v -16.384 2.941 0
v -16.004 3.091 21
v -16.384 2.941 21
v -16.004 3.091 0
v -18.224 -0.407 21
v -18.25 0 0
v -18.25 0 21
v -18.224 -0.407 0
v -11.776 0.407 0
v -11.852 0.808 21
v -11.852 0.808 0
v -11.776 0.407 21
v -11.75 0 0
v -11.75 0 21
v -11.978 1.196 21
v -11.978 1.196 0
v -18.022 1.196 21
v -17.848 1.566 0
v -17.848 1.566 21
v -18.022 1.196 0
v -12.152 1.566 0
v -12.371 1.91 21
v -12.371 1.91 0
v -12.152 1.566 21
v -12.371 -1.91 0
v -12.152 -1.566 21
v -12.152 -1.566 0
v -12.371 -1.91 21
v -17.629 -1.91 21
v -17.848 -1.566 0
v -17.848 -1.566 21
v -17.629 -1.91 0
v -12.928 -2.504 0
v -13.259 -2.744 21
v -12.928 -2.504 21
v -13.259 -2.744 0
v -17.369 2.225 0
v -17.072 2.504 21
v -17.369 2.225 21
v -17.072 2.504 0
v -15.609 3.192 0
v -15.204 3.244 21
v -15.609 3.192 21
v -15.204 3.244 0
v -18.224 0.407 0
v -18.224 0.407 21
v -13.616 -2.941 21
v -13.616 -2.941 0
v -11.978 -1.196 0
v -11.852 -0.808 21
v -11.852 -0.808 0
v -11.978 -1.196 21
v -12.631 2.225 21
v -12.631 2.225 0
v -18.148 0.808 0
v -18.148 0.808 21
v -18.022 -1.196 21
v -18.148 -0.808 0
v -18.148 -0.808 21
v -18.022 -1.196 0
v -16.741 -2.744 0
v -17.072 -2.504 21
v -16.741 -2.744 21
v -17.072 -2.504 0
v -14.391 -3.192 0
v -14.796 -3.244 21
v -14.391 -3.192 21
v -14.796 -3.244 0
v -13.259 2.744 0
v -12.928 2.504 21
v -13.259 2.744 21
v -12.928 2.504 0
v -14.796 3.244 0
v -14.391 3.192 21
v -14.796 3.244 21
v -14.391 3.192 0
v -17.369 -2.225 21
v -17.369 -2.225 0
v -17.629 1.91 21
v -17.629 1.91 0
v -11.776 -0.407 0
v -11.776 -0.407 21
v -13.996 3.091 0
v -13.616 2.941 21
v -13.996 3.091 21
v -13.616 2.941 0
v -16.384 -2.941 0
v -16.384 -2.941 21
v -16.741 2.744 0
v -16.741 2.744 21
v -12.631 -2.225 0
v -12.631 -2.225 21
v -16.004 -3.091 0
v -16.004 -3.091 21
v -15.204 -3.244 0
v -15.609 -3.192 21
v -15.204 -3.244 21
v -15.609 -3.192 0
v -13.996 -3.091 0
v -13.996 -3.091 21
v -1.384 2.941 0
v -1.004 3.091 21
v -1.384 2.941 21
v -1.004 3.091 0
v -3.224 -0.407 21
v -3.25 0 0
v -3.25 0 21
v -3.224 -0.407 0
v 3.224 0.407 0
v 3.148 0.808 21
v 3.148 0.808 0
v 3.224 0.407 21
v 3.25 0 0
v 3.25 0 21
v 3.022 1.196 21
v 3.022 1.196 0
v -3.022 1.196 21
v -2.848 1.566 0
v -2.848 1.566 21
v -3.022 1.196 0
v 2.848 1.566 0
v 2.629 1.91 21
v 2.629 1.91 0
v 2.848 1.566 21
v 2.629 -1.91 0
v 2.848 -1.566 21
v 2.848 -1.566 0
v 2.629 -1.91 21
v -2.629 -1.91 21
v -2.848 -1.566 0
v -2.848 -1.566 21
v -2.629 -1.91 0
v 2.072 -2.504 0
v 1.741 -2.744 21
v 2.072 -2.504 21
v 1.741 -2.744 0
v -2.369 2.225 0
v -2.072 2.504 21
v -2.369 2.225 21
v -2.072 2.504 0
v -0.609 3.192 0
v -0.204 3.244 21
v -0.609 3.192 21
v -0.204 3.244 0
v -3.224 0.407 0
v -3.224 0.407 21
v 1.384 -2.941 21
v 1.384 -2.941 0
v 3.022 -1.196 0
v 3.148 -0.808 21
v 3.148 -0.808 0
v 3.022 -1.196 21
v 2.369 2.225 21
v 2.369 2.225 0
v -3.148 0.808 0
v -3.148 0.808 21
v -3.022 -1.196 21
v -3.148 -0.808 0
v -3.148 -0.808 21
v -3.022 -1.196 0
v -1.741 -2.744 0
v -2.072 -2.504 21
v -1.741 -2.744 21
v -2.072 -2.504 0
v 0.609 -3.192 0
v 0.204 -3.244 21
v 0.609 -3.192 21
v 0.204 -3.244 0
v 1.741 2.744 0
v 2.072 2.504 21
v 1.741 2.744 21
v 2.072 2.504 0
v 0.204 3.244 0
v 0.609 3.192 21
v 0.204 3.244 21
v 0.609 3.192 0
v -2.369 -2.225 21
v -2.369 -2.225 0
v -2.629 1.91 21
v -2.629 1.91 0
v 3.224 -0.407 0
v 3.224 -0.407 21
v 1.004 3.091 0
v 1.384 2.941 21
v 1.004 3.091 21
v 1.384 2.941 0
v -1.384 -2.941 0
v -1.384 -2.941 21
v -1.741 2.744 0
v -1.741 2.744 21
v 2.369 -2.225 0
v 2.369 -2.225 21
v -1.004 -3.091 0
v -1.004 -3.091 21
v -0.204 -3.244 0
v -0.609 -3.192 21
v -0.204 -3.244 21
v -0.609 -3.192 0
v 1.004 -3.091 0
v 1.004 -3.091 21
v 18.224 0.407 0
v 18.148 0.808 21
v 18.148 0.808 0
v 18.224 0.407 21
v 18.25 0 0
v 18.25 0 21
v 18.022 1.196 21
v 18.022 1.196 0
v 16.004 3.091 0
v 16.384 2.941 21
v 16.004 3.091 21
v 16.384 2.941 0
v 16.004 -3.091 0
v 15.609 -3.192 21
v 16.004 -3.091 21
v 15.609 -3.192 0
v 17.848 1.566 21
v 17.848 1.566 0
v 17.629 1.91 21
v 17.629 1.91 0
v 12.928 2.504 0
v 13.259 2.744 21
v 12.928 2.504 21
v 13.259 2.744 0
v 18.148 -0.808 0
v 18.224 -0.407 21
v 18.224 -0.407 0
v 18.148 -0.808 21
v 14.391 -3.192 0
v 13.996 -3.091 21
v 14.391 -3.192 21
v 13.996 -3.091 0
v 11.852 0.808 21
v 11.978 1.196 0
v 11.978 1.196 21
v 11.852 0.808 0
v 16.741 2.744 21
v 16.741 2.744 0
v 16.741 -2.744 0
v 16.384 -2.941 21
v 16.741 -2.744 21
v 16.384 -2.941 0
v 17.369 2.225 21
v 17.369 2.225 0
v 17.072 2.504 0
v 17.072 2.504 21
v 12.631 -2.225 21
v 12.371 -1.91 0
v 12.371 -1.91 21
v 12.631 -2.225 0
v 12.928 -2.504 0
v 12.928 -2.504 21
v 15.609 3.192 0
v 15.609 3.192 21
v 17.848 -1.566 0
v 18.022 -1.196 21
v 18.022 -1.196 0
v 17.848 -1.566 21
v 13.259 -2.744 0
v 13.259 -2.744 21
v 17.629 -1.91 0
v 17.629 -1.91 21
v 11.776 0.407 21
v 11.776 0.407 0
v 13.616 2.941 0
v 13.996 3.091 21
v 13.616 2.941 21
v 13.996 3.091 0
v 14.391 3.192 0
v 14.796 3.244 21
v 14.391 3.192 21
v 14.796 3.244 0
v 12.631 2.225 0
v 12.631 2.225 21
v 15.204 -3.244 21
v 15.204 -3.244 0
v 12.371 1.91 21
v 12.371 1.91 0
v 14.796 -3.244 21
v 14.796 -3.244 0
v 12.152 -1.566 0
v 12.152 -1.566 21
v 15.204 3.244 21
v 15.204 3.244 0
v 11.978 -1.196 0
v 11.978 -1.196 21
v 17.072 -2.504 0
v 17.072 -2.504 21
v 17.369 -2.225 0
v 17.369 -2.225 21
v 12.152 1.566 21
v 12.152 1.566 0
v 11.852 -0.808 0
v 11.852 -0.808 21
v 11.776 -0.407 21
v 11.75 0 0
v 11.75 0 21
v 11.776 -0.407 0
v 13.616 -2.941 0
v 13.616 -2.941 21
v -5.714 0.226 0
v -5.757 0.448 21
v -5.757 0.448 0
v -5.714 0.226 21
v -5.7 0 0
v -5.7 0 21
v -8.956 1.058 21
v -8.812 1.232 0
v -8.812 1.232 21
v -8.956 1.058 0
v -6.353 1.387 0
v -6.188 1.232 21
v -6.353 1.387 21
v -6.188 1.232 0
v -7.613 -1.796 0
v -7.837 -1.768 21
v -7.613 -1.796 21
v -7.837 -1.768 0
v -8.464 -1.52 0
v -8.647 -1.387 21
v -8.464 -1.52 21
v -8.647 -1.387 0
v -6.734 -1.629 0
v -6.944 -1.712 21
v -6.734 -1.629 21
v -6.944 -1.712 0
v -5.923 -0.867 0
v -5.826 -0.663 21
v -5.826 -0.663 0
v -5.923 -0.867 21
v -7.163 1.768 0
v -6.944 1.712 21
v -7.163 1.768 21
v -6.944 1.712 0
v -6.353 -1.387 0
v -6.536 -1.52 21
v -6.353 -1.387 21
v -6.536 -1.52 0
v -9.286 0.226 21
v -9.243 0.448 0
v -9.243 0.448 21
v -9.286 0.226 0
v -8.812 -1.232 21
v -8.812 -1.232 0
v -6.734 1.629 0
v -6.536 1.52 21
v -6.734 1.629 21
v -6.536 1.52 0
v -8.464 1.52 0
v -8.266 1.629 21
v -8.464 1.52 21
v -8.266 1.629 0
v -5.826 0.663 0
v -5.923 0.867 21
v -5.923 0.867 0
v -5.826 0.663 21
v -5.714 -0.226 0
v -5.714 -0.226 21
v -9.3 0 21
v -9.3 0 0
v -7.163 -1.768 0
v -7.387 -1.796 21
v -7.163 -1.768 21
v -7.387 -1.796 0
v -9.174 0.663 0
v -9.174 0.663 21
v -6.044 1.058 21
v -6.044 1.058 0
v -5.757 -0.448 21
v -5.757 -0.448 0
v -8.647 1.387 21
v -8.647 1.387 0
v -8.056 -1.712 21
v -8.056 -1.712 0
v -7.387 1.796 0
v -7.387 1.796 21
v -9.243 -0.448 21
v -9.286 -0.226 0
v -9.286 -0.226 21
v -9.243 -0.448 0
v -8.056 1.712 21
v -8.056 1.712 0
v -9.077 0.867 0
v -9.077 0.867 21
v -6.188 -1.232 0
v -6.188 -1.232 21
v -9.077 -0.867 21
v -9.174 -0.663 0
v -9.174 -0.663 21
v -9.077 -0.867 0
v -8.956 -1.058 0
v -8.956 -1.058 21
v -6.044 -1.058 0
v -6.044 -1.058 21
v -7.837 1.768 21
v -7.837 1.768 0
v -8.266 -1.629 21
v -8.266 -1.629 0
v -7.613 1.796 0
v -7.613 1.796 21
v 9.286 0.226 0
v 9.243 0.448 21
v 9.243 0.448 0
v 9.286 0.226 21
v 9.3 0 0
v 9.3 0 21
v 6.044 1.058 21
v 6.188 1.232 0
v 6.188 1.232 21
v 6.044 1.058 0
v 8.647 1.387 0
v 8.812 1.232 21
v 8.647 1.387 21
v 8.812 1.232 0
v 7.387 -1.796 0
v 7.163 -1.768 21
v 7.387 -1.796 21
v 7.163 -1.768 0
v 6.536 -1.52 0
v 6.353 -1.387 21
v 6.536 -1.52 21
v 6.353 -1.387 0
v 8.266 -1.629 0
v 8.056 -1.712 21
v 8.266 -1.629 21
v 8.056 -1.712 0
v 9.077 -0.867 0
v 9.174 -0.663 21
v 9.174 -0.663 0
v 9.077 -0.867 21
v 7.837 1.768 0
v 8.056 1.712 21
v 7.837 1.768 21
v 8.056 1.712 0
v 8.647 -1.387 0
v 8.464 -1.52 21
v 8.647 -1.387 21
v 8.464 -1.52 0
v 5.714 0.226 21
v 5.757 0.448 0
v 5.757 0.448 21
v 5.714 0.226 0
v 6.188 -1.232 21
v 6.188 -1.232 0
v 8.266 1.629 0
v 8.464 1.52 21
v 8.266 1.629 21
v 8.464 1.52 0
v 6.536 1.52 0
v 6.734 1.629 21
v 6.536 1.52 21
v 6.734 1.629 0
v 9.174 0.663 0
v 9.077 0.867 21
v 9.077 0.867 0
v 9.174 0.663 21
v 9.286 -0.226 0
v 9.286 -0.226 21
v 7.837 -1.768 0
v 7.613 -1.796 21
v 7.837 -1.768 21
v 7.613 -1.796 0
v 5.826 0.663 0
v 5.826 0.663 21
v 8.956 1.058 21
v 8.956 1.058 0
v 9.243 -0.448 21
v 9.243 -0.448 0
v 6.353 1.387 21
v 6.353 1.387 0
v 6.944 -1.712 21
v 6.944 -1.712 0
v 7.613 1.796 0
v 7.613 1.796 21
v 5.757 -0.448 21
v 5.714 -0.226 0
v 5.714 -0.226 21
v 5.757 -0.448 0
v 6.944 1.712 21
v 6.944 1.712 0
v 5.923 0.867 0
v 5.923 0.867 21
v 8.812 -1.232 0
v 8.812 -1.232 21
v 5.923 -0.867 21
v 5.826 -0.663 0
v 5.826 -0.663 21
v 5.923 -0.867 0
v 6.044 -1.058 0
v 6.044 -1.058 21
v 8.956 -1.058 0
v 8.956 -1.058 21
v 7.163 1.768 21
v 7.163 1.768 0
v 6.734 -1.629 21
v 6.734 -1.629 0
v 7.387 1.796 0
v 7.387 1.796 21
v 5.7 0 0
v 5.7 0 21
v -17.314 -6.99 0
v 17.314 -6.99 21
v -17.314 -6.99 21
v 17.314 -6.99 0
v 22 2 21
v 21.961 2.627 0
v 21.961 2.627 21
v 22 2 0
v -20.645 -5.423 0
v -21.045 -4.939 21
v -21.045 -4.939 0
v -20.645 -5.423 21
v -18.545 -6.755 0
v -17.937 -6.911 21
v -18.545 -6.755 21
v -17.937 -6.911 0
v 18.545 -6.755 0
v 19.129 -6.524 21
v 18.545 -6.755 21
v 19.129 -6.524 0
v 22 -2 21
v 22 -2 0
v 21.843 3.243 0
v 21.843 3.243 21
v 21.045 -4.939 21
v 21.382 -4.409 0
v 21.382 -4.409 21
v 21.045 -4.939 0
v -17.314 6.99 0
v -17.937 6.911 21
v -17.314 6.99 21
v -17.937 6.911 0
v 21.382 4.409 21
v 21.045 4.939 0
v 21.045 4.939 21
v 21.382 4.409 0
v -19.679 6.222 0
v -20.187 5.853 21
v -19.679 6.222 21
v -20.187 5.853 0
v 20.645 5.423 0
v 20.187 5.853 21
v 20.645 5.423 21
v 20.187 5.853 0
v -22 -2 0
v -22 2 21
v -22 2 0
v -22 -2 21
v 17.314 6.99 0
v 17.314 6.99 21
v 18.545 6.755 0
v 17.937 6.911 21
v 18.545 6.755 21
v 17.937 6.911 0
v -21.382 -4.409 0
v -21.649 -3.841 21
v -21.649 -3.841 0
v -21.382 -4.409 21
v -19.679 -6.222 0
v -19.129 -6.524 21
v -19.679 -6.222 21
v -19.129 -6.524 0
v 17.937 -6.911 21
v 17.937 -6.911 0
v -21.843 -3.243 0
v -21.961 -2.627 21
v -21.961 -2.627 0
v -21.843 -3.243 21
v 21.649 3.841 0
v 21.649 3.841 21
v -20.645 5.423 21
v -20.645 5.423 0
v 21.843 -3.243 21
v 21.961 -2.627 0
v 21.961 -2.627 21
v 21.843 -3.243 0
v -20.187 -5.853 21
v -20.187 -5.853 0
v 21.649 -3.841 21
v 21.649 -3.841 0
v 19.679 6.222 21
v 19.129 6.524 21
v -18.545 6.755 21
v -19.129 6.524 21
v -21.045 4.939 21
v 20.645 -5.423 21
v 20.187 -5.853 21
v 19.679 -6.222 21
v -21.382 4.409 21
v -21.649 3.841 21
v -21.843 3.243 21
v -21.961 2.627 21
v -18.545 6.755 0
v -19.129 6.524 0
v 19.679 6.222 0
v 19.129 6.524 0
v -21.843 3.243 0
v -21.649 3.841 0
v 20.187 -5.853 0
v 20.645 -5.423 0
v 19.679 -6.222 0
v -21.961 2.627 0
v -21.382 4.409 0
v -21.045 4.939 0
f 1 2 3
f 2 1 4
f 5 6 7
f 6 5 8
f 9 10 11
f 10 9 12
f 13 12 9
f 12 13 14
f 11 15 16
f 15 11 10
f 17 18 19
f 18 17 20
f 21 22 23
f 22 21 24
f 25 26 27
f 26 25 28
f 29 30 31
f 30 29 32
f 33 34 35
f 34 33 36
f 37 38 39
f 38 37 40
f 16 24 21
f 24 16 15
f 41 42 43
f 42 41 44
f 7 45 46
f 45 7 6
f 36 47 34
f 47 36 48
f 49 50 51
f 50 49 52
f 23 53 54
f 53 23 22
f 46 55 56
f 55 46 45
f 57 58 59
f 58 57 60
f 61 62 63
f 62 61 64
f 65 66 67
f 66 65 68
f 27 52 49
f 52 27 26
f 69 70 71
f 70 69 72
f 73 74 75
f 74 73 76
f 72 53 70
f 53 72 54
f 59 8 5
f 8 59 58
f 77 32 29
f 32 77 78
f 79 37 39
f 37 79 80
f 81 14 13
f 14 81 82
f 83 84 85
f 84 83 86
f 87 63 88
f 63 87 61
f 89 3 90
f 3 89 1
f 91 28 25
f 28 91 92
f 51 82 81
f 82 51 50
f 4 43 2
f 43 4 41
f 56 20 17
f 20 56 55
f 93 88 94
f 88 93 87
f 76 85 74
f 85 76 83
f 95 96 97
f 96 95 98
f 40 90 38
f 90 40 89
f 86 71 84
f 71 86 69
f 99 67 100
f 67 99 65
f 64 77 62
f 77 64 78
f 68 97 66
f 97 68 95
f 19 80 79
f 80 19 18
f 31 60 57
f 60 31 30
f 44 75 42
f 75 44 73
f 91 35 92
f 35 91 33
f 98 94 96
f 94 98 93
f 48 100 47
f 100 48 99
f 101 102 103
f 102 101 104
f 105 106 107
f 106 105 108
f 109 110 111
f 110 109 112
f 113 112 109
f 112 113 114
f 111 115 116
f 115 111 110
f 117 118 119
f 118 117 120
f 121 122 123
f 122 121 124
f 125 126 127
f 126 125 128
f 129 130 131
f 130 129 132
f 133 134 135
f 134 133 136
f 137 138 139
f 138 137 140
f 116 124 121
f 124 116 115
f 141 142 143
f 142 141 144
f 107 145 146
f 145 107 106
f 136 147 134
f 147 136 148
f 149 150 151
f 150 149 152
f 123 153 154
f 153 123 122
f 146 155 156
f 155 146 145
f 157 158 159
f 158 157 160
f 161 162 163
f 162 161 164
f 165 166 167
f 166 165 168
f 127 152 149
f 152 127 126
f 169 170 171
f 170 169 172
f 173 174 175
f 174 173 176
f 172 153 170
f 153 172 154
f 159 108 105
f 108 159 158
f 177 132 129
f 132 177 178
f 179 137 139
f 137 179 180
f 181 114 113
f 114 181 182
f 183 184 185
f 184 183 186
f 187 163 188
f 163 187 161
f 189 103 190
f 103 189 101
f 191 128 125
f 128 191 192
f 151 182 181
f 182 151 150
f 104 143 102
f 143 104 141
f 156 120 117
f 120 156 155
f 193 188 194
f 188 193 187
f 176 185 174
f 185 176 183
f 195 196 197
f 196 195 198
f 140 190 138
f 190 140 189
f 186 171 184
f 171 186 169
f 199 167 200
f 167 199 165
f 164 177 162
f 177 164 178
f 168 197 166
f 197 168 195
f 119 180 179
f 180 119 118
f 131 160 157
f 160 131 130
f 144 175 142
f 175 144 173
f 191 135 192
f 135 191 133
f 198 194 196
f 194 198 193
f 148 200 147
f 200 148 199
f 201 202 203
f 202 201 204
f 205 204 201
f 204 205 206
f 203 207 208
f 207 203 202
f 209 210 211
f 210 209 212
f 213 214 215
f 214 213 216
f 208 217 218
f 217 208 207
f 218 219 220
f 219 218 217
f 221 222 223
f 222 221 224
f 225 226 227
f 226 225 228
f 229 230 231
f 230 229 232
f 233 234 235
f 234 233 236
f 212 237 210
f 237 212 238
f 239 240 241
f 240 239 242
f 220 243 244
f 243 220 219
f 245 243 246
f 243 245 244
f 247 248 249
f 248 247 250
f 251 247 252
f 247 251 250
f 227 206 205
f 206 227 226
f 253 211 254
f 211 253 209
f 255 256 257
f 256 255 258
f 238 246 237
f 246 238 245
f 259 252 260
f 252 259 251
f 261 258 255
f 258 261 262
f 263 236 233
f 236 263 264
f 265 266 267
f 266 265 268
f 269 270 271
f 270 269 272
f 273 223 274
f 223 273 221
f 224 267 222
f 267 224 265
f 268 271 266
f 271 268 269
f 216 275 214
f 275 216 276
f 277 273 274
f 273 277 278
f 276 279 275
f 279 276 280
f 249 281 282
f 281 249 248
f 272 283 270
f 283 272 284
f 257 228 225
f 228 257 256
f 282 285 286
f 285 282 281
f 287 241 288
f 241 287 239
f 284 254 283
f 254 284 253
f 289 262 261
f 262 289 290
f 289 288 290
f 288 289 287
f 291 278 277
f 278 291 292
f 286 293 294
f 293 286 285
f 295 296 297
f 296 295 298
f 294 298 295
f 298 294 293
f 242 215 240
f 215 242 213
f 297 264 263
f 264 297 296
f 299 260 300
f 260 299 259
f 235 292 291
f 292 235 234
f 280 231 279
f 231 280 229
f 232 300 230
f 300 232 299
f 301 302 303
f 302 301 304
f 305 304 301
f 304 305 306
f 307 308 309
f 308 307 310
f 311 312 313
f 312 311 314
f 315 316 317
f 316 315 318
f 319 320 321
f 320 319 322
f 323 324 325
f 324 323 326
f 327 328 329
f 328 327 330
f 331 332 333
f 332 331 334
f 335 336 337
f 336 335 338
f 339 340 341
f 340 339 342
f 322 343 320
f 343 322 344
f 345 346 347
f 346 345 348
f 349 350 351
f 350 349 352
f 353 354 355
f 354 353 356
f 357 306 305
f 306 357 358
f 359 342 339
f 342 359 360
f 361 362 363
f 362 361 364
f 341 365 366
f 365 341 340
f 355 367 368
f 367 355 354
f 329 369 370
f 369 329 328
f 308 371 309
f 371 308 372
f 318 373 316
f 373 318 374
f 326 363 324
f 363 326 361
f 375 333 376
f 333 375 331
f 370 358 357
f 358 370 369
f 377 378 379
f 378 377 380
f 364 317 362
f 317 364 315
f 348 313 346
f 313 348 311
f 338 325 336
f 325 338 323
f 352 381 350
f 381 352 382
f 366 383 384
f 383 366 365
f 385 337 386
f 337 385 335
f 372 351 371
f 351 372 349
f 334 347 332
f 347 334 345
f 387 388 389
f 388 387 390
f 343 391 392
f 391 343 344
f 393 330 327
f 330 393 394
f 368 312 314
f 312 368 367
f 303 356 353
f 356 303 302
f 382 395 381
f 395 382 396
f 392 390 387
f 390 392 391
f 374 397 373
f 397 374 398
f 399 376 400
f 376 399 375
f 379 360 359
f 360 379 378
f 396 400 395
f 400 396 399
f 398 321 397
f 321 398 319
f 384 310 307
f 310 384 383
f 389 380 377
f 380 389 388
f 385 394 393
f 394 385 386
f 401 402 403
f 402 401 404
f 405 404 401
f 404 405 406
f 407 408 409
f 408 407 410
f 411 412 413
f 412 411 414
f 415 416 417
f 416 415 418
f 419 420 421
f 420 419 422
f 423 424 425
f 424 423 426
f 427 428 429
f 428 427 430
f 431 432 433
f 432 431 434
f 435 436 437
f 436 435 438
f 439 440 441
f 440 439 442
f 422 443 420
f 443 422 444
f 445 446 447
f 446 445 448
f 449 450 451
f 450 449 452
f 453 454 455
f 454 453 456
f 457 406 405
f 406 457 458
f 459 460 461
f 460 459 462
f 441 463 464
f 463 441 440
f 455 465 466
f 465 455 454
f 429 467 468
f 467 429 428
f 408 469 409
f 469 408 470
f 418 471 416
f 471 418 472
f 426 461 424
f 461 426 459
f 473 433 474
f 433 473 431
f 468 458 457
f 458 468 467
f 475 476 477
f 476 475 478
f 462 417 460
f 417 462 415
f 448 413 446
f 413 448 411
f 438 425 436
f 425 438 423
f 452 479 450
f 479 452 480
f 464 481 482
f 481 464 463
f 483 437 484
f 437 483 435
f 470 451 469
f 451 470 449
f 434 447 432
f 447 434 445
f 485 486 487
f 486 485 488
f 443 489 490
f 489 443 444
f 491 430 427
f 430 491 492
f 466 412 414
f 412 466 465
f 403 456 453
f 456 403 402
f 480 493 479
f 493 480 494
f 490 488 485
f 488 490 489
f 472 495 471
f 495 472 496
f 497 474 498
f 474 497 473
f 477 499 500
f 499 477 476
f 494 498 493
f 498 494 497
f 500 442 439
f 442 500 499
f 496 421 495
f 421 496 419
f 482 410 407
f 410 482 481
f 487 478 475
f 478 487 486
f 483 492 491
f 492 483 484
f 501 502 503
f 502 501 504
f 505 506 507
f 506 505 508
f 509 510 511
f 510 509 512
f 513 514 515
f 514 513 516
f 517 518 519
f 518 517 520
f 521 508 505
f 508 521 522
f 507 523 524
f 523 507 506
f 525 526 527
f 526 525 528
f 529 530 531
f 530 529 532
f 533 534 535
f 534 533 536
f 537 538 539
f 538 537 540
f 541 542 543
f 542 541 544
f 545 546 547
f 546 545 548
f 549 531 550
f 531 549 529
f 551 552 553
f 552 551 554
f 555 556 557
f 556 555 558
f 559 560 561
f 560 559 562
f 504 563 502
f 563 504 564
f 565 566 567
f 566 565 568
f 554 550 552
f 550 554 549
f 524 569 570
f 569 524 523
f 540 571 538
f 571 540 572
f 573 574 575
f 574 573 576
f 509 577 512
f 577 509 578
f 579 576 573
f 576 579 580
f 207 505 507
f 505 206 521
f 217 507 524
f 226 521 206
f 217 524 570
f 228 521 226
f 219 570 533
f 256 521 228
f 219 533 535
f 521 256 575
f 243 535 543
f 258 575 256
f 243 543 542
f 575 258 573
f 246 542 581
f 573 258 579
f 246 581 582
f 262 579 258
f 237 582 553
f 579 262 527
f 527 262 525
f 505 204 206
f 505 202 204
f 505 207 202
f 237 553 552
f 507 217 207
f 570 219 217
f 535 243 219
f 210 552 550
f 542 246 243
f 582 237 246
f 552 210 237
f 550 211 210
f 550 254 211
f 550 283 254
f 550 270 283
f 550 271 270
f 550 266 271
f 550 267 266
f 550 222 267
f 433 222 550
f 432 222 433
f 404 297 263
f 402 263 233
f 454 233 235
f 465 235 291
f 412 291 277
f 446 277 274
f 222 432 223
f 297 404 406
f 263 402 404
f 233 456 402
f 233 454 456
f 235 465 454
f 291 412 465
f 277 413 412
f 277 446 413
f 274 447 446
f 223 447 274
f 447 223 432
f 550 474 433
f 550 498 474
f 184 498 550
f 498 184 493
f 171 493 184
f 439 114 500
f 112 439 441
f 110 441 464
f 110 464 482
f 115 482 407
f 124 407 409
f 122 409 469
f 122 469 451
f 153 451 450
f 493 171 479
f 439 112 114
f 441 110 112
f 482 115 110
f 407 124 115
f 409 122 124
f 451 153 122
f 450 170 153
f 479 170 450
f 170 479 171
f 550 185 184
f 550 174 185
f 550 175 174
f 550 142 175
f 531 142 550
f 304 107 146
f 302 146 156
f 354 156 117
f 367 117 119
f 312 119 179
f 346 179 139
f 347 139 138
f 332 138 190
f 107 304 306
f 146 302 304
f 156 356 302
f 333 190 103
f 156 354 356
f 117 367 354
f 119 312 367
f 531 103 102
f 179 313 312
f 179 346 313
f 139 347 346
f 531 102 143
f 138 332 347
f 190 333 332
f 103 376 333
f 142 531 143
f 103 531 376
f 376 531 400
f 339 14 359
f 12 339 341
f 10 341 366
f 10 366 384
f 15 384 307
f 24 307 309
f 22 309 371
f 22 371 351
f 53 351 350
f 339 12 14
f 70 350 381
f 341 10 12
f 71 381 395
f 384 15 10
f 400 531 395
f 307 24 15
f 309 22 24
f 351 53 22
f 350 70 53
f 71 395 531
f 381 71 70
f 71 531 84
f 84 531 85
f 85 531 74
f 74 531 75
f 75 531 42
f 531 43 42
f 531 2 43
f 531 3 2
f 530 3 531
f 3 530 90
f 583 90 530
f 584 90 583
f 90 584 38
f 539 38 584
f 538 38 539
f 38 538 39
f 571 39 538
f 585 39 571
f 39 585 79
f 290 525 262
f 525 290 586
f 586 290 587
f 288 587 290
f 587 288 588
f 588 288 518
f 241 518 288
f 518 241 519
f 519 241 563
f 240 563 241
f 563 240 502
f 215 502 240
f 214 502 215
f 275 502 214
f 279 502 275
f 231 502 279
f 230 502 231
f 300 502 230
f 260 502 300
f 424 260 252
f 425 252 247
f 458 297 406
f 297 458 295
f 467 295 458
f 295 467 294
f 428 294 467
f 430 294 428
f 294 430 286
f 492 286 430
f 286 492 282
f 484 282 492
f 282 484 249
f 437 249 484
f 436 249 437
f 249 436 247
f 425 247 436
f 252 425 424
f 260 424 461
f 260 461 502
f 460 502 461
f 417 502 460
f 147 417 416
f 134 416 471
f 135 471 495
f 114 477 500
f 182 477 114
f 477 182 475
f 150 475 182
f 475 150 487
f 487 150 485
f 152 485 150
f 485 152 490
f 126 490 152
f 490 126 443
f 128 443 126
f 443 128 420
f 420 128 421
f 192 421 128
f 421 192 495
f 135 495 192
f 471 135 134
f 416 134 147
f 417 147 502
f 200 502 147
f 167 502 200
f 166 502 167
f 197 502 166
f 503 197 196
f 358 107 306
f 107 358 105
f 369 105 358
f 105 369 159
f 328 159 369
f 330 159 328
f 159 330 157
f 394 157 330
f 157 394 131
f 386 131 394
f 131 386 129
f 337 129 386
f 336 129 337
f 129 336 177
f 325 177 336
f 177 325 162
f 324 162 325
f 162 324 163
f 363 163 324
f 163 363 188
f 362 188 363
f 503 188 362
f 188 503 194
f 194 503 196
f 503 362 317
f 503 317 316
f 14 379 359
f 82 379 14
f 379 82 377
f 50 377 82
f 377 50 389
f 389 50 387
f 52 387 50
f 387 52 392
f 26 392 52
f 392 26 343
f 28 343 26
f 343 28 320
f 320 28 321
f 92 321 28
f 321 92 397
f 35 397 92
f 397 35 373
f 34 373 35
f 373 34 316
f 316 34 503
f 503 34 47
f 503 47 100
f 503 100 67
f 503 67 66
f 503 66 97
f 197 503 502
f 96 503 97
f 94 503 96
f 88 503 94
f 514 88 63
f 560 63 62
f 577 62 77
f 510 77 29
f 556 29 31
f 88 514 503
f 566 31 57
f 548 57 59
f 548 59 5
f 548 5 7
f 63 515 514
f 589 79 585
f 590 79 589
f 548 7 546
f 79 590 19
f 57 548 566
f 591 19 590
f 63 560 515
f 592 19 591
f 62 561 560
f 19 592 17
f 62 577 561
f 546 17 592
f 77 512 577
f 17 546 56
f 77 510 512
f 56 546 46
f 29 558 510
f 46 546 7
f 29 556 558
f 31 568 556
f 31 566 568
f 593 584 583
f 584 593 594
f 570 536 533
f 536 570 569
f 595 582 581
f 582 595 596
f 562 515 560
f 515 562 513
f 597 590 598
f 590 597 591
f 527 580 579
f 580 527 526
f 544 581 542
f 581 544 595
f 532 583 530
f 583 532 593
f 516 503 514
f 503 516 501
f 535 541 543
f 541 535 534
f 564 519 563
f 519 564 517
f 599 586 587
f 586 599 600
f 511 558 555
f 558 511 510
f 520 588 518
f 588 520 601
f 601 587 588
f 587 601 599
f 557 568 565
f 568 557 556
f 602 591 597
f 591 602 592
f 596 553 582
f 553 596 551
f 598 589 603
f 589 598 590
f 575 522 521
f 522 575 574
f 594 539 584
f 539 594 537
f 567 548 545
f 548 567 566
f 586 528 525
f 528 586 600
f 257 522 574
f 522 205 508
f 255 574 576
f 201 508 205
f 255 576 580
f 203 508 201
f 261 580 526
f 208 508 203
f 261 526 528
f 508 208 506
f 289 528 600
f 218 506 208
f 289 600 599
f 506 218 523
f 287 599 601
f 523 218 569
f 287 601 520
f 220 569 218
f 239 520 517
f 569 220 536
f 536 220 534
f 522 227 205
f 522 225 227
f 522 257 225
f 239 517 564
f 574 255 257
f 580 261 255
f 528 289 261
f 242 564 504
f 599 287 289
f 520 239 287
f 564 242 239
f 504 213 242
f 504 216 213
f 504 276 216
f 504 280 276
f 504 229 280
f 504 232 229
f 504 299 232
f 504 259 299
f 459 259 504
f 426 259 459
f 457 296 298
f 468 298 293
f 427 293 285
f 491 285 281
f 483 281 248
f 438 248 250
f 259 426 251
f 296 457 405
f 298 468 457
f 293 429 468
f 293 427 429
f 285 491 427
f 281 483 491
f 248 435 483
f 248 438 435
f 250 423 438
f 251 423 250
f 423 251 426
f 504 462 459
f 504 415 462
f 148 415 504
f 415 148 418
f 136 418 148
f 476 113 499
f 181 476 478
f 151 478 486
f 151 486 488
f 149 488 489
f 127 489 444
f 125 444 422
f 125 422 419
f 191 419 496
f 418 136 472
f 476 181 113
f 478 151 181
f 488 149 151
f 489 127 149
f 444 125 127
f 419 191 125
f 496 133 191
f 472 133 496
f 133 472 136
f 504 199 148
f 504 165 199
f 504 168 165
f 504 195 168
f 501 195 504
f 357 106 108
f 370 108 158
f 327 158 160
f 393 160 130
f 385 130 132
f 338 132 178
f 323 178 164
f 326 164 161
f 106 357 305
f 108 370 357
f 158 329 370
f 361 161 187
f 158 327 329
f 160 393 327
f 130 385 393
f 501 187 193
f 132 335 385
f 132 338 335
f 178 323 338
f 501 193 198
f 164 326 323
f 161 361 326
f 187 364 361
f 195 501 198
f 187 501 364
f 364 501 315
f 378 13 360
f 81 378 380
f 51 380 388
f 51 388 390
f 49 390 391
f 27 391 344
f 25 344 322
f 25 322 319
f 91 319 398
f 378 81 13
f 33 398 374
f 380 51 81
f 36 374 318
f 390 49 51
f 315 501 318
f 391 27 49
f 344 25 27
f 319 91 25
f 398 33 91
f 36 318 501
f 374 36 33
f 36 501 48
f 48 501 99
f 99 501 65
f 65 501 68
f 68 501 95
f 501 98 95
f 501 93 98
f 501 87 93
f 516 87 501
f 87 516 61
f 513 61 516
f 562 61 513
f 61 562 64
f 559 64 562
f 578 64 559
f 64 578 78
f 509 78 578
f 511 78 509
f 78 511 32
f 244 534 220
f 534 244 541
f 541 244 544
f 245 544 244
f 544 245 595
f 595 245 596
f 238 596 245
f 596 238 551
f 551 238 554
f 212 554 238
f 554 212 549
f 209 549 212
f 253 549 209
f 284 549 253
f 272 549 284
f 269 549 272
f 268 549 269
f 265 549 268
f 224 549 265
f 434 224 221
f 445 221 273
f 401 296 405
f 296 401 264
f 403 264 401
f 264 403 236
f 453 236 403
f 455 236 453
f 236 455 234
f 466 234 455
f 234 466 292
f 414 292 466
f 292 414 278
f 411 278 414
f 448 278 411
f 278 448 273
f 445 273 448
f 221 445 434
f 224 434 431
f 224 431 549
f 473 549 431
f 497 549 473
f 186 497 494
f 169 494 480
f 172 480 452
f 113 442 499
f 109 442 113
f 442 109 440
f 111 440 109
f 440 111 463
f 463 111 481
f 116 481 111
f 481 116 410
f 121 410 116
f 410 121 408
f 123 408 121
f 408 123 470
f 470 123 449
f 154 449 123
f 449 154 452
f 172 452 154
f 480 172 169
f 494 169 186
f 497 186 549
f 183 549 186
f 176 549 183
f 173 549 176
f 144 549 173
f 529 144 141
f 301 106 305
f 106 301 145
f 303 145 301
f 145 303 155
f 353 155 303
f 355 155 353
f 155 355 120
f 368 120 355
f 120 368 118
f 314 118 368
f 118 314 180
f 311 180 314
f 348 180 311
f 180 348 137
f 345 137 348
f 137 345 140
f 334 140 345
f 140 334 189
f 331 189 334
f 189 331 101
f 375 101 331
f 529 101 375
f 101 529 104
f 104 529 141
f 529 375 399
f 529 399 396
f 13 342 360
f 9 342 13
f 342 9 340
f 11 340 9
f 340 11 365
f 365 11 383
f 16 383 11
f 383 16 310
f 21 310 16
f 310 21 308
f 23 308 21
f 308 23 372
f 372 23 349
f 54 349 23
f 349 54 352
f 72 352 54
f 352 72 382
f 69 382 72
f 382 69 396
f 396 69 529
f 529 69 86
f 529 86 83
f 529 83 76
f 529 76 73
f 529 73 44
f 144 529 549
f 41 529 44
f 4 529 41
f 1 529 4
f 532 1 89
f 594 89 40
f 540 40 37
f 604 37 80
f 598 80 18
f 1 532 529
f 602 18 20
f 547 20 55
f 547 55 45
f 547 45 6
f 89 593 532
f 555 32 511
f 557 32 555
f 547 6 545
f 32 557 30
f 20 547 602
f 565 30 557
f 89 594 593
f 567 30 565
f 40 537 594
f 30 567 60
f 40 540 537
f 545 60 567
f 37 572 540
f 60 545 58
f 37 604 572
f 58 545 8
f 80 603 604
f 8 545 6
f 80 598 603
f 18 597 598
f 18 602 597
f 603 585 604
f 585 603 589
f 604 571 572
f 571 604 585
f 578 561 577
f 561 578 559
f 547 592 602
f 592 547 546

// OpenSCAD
$fn = 50;


difference() {
	union() {
		*color(alpha = 1.0000000000, c = "gray") {
			translate(v = [0, 7, 0]) {
				linear_extrude(height = 1) {
					text(font = "Arial:style=Bold", halign = "center", size = 4.5000000000, text = "COMMENT plate main", valign = "center");
				}
			}
		}
		*color(alpha = 1.0000000000, c = "gray") {
			translate(v = [0, 14, 0]) {
				linear_extrude(height = 1) {
					text(font = "Arial:style=Bold", halign = "center", size = 4.5000000000, text = "COMMENT description oobb_plate_shape_p_type_21_depth_3_width_1_height_21_thickness_true_both_holes", valign = "center");
				}
			}
		}
		hull() {
			translate(v = [-17.0000000000, 2.0000000000, 0]) {
				cylinder(h = 21, r = 5);
			}
			translate(v = [17.0000000000, 2.0000000000, 0]) {
				cylinder(h = 21, r = 5);
			}
			translate(v = [-17.0000000000, -2.0000000000, 0]) {
				cylinder(h = 21, r = 5);
			}
			translate(v = [17.0000000000, -2.0000000000, 0]) {
				cylinder(h = 21, r = 5);
			}
		}
	}
	union() {
		*color(alpha = 1.0000000000, c = "gray") {
			translate(v = [0, 7, 0]) {
				linear_extrude(height = 1) {
					text(font = "Arial:style=Bold", halign = "center", size = 4.5000000000, text = "COMMENT holes main", valign = "center");
				}
			}
		}
		*color(alpha = 1.0000000000, c = "gray") {
			translate(v = [0, 14, 0]) {
				linear_extrude(height = 1) {
					text(font = "Arial:style=Bold", halign = "center", size = 4.5000000000, text = "COMMENT description oobb_holes_shape_n_type_3_width_1_height_21_thickness_true_both_holes", valign = "center");
				}
			}
		}
		translate(v = [-15.0000000000, 0.0000000000, 0]) {
			translate(v = [0, 0, -50]) {
				cylinder(h = 100, r = 3.2500000000);
			}
		}
		translate(v = [0, 0, -50]) {
			cylinder(h = 100, r = 3.2500000000);
		}
		translate(v = [15.0000000000, 0.0000000000, 0]) {
			translate(v = [0, 0, -50]) {
				cylinder(h = 100, r = 3.2500000000);
			}
		}
		translate(v = [-15.0000000000, 0.0000000000, 0]) {
			translate(v = [0, 0, -50]) {
				cylinder(h = 100, r = 1.8000000000);
			}
		}
		translate(v = [-7.5000000000, 0.0000000000, 0]) {
			translate(v = [0, 0, -50]) {
				cylinder(h = 100, r = 1.8000000000);
			}
		}
		translate(v = [0, 0, -50]) {
			cylinder(h = 100, r = 1.8000000000);
		}
		translate(v = [7.5000000000, 0.0000000000, 0]) {
			translate(v = [0, 0, -50]) {
				cylinder(h = 100, r = 1.8000000000);
			}
		}
		translate(v = [15.0000000000, 0.0000000000, 0]) {
			translate(v = [0, 0, -50]) {
				cylinder(h = 100, r = 1.8000000000);
			}
		}
	}
}
